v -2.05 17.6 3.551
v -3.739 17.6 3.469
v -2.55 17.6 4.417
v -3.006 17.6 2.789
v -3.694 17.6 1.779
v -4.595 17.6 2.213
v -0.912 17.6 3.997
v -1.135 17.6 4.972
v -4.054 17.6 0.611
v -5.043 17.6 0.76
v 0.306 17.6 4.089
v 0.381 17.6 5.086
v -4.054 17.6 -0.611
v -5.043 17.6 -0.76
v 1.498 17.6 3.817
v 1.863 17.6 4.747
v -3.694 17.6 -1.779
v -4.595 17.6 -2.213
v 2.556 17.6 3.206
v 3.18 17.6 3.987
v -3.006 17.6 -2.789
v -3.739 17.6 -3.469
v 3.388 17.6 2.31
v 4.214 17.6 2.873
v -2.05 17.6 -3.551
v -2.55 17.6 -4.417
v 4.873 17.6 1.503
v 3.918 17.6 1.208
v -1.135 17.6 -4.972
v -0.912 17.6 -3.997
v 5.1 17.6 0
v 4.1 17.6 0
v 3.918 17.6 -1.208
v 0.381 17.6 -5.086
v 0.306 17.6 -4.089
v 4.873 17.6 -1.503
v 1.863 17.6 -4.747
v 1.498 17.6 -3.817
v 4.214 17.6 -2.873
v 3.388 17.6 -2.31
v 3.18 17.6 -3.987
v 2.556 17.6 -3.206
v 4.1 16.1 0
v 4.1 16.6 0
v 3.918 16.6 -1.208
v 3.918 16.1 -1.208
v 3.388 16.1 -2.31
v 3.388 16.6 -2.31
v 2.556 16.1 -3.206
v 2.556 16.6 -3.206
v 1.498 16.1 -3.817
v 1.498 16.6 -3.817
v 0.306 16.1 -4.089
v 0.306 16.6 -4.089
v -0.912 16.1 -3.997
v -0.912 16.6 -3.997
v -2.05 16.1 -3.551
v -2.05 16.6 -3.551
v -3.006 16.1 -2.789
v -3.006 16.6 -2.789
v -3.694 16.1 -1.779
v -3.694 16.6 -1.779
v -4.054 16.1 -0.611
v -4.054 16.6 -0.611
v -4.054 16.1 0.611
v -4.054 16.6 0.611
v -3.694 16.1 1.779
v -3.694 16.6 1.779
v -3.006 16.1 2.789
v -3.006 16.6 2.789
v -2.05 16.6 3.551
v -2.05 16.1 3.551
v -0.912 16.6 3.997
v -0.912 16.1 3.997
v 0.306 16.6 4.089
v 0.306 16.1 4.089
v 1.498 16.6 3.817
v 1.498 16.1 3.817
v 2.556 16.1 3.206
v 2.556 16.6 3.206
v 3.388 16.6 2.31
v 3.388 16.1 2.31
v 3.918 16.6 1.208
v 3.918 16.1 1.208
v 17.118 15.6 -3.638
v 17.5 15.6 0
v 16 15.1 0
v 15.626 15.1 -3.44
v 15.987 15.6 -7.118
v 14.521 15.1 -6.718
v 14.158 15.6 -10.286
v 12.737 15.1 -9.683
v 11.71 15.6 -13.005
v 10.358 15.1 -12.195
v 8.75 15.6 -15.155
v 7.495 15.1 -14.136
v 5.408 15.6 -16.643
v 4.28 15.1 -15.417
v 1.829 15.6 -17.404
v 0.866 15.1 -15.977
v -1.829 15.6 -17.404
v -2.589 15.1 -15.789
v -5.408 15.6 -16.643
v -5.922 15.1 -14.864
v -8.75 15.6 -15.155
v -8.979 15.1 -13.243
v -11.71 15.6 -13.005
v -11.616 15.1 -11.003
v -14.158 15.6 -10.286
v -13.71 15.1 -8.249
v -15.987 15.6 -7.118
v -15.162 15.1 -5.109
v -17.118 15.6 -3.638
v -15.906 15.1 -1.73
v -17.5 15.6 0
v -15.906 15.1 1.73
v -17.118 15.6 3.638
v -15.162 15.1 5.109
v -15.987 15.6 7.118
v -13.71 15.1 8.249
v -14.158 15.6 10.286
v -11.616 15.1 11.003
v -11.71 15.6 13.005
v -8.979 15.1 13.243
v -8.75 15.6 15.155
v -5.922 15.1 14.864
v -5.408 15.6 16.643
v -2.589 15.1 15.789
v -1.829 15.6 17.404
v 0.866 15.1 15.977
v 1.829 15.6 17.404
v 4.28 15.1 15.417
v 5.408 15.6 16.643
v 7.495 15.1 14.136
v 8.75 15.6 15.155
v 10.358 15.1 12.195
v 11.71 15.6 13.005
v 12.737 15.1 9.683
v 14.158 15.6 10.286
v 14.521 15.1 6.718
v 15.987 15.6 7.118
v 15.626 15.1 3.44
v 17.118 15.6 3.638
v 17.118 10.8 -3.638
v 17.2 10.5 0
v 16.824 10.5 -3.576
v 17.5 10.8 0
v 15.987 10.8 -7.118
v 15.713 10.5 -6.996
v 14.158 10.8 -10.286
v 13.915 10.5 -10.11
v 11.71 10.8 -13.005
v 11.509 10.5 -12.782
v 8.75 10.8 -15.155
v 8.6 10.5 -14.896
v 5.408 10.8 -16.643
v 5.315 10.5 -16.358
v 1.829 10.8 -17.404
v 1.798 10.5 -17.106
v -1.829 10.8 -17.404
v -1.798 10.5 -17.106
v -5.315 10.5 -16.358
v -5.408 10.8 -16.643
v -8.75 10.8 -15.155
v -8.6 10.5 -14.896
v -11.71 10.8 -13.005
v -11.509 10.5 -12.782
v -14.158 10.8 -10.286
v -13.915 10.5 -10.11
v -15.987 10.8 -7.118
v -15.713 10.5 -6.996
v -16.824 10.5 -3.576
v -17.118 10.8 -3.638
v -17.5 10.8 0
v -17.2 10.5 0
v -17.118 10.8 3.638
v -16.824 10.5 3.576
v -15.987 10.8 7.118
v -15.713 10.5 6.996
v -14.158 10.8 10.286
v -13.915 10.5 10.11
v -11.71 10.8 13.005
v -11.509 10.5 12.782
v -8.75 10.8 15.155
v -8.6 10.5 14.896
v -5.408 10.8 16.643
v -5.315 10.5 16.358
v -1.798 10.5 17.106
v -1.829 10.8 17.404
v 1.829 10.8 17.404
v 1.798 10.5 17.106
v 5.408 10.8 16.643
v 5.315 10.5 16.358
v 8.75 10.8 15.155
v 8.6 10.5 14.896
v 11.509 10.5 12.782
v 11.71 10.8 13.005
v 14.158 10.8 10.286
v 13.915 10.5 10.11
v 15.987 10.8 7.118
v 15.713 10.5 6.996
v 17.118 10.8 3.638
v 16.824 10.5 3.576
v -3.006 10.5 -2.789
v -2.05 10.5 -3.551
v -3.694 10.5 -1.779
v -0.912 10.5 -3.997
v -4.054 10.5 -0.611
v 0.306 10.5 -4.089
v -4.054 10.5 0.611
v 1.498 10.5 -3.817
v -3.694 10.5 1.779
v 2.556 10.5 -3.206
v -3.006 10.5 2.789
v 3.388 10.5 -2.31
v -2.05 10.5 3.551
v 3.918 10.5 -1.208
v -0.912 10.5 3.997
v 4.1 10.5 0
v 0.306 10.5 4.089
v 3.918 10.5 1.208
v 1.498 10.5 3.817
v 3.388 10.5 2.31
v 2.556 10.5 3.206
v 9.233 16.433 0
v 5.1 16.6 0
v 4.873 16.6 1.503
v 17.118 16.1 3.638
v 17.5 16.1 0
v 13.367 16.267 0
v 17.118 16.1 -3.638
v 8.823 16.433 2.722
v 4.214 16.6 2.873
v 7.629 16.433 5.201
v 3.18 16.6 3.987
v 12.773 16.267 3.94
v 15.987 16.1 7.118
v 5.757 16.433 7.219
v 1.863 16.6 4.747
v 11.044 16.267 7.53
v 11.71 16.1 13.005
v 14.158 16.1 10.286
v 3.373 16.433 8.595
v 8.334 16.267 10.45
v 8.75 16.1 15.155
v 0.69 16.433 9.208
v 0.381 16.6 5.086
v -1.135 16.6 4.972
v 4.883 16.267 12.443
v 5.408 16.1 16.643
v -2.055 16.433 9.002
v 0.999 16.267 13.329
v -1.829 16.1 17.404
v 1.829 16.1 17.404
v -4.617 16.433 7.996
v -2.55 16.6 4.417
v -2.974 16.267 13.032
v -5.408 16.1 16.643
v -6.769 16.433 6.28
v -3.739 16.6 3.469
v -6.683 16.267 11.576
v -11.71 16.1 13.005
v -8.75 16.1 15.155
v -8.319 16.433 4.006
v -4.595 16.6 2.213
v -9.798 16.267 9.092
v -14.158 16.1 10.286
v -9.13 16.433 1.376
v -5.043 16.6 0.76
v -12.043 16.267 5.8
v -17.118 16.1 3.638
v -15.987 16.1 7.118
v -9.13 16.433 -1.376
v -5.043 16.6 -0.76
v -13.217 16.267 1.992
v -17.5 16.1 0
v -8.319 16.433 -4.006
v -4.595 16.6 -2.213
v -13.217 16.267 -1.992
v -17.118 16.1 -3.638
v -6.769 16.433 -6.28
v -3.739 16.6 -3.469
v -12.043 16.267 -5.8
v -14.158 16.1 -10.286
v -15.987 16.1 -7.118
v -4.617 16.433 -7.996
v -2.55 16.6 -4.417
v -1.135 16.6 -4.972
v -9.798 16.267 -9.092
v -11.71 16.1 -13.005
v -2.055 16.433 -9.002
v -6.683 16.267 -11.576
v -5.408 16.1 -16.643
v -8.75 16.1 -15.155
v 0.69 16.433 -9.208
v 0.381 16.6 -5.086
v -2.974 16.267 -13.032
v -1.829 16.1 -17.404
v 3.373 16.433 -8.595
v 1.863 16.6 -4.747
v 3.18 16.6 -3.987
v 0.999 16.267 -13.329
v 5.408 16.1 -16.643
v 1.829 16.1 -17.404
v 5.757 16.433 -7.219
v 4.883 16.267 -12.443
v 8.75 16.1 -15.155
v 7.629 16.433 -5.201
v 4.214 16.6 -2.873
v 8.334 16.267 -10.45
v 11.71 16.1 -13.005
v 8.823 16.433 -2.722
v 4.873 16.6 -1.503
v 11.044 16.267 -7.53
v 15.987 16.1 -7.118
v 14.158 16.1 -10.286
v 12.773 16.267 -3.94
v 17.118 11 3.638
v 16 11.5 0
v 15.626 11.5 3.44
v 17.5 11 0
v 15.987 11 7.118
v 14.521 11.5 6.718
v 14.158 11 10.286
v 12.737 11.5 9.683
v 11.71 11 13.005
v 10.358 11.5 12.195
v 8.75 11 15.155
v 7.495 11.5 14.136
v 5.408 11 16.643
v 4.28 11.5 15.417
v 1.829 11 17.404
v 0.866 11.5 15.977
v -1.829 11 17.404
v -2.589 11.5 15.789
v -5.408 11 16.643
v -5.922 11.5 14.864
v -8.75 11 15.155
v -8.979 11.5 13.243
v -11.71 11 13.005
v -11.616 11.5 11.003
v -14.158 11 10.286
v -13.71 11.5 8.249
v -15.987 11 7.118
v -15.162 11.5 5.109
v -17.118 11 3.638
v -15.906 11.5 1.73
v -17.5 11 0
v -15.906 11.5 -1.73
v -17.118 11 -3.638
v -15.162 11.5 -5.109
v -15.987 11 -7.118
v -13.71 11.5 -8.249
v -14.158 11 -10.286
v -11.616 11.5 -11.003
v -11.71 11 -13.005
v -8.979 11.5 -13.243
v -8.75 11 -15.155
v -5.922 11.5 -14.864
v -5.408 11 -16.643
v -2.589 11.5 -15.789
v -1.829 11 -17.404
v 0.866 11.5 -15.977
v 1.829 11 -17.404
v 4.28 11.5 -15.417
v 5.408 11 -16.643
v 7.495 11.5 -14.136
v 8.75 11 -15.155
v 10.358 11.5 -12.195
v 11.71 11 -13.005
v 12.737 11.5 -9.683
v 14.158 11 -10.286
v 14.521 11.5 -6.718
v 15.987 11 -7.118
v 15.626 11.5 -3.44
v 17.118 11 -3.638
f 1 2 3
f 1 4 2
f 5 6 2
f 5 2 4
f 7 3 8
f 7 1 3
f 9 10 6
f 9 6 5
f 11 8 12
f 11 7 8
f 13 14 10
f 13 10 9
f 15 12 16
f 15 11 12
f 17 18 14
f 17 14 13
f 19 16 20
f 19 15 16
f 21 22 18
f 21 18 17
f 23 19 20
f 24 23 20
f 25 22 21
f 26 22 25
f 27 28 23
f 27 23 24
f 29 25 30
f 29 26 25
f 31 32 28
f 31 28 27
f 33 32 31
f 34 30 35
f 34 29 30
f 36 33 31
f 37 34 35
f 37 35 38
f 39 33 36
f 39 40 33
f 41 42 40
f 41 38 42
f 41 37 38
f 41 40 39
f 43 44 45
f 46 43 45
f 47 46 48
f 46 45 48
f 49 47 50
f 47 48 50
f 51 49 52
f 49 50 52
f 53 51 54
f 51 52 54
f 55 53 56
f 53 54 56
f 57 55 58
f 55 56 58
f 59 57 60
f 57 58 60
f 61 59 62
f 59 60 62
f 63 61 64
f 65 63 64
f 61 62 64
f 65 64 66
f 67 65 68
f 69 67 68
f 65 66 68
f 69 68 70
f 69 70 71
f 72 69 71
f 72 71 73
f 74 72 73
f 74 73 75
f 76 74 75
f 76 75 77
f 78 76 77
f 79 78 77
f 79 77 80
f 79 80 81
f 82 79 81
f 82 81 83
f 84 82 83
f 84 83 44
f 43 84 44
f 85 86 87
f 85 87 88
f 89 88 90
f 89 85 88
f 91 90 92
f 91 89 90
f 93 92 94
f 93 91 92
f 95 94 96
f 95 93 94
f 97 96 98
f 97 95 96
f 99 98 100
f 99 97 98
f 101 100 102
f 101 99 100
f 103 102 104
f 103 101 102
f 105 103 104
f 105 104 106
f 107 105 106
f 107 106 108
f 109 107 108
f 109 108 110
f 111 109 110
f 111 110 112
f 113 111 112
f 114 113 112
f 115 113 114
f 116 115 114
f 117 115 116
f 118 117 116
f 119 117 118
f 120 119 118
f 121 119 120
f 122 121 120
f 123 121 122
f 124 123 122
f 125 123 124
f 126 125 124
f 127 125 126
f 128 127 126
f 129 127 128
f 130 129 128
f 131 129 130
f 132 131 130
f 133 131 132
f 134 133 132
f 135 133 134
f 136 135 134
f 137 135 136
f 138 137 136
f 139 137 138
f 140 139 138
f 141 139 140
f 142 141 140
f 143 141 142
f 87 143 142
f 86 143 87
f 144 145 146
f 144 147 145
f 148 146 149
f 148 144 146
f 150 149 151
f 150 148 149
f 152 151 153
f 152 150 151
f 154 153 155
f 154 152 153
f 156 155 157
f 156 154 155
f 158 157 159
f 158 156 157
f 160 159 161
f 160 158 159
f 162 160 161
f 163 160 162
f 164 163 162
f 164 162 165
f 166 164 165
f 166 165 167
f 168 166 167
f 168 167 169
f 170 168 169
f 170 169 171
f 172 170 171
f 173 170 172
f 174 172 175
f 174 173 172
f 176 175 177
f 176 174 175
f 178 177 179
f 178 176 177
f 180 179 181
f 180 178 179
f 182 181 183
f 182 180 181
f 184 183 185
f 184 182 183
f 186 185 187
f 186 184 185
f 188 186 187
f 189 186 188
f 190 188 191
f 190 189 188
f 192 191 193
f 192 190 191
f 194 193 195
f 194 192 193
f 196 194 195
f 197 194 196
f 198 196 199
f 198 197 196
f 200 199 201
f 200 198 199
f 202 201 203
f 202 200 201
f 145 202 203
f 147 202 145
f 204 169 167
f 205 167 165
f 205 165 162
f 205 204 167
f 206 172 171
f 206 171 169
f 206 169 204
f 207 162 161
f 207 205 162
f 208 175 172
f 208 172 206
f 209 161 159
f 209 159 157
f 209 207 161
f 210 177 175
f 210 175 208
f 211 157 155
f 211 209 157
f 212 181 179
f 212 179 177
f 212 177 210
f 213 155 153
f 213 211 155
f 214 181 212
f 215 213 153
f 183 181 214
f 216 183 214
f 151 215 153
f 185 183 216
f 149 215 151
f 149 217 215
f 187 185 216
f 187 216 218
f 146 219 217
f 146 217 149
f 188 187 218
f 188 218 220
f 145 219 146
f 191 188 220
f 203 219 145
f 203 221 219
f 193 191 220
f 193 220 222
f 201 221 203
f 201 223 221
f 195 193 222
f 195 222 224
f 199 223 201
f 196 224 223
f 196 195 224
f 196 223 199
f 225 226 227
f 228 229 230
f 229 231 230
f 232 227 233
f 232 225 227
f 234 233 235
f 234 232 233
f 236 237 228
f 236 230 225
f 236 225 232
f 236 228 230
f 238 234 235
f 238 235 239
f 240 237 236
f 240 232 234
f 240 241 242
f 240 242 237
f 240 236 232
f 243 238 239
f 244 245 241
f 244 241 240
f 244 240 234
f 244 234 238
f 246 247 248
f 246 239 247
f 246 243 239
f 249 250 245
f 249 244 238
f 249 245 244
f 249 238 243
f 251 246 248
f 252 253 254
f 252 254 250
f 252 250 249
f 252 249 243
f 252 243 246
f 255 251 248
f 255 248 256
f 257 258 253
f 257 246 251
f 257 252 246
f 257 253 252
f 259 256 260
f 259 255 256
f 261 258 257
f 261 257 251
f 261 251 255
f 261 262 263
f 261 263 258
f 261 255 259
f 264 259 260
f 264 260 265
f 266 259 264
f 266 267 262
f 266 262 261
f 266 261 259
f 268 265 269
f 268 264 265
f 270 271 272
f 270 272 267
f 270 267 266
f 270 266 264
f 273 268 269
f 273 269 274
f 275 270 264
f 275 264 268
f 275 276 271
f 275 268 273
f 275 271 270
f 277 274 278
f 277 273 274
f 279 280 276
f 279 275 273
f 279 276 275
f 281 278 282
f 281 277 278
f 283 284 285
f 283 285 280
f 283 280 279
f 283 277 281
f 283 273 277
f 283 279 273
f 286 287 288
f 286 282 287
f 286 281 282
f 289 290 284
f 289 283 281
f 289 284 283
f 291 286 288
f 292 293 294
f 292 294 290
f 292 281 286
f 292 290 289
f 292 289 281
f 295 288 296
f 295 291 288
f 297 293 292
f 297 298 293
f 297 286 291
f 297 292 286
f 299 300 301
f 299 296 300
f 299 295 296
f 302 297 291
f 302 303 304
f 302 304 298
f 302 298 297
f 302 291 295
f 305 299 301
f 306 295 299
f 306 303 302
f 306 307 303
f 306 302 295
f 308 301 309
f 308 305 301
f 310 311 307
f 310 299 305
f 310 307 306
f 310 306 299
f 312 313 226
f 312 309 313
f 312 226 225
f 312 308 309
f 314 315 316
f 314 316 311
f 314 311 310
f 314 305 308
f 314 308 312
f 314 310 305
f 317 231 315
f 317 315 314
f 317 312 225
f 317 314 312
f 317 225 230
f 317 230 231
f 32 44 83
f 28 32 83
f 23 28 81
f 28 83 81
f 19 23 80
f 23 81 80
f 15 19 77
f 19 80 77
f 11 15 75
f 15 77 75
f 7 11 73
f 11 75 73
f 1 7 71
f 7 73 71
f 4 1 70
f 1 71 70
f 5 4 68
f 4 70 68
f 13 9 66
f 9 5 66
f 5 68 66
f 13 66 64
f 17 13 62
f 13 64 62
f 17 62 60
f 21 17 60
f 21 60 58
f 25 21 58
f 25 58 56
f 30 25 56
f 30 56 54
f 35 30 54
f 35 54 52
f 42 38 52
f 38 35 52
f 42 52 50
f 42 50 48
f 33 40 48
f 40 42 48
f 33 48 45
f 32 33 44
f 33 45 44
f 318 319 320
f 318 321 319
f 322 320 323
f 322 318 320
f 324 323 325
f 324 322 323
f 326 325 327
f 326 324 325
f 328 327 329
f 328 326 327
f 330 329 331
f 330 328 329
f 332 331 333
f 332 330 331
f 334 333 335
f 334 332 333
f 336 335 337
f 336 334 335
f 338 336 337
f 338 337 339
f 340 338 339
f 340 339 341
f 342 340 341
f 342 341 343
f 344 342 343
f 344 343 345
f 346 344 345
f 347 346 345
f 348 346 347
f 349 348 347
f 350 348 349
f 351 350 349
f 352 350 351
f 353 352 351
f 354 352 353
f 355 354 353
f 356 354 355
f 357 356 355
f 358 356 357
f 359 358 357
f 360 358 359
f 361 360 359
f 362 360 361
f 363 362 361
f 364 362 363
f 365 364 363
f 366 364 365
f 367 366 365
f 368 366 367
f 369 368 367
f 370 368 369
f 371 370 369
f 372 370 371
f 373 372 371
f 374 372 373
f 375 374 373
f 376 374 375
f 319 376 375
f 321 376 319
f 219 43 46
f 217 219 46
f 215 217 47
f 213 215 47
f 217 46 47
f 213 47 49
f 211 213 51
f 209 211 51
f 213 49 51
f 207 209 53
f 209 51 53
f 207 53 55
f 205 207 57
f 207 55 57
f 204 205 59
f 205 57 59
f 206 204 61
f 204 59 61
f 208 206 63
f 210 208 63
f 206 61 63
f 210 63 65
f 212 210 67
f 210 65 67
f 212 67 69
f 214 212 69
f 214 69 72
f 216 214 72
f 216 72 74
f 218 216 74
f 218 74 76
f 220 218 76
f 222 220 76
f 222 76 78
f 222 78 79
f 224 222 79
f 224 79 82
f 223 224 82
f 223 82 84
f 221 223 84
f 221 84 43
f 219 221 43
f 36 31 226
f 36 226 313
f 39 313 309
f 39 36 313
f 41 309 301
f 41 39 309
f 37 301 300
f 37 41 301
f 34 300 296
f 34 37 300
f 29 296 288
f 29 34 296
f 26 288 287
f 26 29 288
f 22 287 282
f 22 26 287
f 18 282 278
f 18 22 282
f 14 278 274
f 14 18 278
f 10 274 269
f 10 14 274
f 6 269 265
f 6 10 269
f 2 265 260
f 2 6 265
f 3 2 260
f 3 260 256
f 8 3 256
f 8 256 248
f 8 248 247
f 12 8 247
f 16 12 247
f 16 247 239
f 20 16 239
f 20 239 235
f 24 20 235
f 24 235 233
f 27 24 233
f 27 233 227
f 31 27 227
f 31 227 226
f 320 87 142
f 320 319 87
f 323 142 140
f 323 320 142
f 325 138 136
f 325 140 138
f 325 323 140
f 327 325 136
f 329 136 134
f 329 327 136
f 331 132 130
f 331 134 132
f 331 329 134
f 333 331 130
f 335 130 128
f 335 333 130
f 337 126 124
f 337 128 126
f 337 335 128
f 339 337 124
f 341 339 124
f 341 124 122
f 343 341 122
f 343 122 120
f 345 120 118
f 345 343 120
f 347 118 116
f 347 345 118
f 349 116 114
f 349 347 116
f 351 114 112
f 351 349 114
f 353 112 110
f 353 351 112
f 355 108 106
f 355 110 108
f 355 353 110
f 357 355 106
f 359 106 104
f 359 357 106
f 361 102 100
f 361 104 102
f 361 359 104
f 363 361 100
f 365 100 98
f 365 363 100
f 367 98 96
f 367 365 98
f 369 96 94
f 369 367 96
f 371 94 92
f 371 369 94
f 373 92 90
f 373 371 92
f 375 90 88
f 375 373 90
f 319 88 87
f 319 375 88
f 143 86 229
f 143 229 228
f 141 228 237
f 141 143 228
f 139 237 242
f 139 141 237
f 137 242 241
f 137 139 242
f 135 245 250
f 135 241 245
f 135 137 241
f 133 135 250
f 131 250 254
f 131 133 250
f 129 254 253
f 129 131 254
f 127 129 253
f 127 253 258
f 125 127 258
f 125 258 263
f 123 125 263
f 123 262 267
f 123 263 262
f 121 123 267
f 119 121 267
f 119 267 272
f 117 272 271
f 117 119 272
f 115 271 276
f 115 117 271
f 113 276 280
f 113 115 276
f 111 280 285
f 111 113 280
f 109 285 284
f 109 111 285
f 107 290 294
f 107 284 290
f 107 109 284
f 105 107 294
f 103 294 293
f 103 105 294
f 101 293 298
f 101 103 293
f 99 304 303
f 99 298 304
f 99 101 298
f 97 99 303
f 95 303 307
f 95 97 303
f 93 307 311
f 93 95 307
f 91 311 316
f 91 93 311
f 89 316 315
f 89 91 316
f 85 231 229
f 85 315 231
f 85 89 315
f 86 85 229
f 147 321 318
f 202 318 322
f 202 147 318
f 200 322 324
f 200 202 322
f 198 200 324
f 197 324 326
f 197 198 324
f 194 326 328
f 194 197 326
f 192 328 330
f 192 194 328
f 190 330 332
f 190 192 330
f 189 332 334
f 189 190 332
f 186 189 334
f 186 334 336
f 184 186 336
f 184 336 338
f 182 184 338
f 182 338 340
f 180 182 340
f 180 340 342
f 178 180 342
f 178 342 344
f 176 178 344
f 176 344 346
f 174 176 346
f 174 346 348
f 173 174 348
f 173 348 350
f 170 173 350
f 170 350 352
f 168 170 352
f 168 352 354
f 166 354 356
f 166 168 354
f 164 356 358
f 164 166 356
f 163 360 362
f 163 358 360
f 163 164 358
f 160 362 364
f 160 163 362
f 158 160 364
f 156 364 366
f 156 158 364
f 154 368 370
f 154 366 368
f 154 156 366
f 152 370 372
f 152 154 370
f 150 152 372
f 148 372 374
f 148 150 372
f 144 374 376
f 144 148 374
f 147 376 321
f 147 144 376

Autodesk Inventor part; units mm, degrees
ref_plane "XZ Plane" through (0, 0, 0) normal (0, 1, 0) x (-1, 0, 0)
ref_plane "XY Plane" through (0, 0, 0) normal (0, 0, 1) x (1, 0, 0)
sketch "Sketch1" plane through (0, 0, 0) normal (0, 0, 1) x (1, 0, 0)
  line L0 (0, 0) -> (0, 16.1) construction
  line L1 (0, 0) -> (4.1, 0) construction
  line L2 (4.1, 0) -> (4.1, 16.1)
  line L3 (4.1, 16.1) -> (0, 16.1) construction
  line L4 (4.1, 16.1) -> (17.5, 16.1) construction
  line L5 (17.5, 16.1) -> (17.5, 15.6)
  line L6 (17.5, 15.6) -> (16, 15.1)
  line L7 (16, 15.1) -> (16, 11.5)
  line L8 (16, 11.5) -> (17.5, 11)
  line L9 (17.5, 11) -> (17.5, 10)
  line L10 (17.5, 10) -> (9, 6)
  line L11 (9, 6) -> (9, 0)
  line L12 (9, 0) -> (4.1, 0)
  line L13 (9, 0) -> (5.1, -1) construction
  line L14 (5.1, -1) -> (4.1, -1) construction
  line L15 (4.1, -1) -> (4.1, 0) construction
  line L16 (4.1, 16.1) -> (4.1, 16.6)
  line L17 (4.1, 16.6) -> (5.1, 16.6) construction
  line L18 (5.1, 16.6) -> (17.5, 16.1)
  line L19 (5.1, 16.6) -> (5.1, 17.6)
  line L20 (5.1, 17.6) -> (4.1, 17.6)
  line L21 (4.1, 17.6) -> (4.1, 16.6)
  dimension "d0" = 4.1
  dimension "d1" = 3.6
  dimension "d2" = 0.5
  dimension "d3" = 1
  dimension "d4" = 0.5
  dimension "d5" = 1.5
  dimension "d6" = 9
  dimension "d7" = 16
  dimension "d8" = 4
  dimension "d9" = 6
  dimension "d11" = 1
  dimension "d12" = 1
  dimension "d13" = 1
  dimension "d14" = 0.5
  dimension "d15" = 1
revolve "Revolution1" add sketch "Sketch1" angle 360 about axis through (0, 0, 0) along (0, 1, 0)
ref_plane "Work Plane1" through (4, 0, 0) normal (1, 0, 0) x (0, 1, 0)
sketch "Sketch2" plane through (4, 0, 0) normal (1, 0, 0) x (0, 1, 0)
  line L0 (0, 0) -> (2.85, 0) construction
  line L1 (0, 2.85) -> (5.7, 2.85)
  line L2 (5.7, 2.85) -> (5.7, -2.85)
  line L3 (5.7, -2.85) -> (0, -2.85)
  line L4 (0, -2.85) -> (0, 2.85)
  line L5 (0, 2.85) -> (5.7, -2.85) construction
  line L6 (5.7, 2.85) -> (0, -2.85) construction
  line L7 (0, 4.1) -> (0, -4.1) projected
  dimension "d17" = 5.7
  dimension "d18" = 5.7
extrude "Extrusion1" cut sketch "Sketch2" along normal blind 2.5 and the other way blind 3
sketch "Sketch3" plane through (4, 0, 0) normal (1, 0, 0) x (0, 1, 0)
  line L0 (5.7, -2.85) -> (0, 2.85) construction
  circle A0 centre (2.85, 0) radius 1.7
  point P0 (0, 0)
  dimension "d23" = 3.4
extrude "Extrusion2" cut sketch "Sketch3" along normal through all
sketch "Sketch4" plane through (0, 0, 0) normal (0, -1, 0) x (1, 0, 0)
  circle A0 centre (0, 0) radius 26.9979
extrude "SetScrewDelete" cut sketch "Sketch4" against normal blind 10.5
chamfer "Chamfer1" distance 0.3 angle 45 1 edges at (-17.5, 10.5, 0)
properties part number "DrivenPulley"
